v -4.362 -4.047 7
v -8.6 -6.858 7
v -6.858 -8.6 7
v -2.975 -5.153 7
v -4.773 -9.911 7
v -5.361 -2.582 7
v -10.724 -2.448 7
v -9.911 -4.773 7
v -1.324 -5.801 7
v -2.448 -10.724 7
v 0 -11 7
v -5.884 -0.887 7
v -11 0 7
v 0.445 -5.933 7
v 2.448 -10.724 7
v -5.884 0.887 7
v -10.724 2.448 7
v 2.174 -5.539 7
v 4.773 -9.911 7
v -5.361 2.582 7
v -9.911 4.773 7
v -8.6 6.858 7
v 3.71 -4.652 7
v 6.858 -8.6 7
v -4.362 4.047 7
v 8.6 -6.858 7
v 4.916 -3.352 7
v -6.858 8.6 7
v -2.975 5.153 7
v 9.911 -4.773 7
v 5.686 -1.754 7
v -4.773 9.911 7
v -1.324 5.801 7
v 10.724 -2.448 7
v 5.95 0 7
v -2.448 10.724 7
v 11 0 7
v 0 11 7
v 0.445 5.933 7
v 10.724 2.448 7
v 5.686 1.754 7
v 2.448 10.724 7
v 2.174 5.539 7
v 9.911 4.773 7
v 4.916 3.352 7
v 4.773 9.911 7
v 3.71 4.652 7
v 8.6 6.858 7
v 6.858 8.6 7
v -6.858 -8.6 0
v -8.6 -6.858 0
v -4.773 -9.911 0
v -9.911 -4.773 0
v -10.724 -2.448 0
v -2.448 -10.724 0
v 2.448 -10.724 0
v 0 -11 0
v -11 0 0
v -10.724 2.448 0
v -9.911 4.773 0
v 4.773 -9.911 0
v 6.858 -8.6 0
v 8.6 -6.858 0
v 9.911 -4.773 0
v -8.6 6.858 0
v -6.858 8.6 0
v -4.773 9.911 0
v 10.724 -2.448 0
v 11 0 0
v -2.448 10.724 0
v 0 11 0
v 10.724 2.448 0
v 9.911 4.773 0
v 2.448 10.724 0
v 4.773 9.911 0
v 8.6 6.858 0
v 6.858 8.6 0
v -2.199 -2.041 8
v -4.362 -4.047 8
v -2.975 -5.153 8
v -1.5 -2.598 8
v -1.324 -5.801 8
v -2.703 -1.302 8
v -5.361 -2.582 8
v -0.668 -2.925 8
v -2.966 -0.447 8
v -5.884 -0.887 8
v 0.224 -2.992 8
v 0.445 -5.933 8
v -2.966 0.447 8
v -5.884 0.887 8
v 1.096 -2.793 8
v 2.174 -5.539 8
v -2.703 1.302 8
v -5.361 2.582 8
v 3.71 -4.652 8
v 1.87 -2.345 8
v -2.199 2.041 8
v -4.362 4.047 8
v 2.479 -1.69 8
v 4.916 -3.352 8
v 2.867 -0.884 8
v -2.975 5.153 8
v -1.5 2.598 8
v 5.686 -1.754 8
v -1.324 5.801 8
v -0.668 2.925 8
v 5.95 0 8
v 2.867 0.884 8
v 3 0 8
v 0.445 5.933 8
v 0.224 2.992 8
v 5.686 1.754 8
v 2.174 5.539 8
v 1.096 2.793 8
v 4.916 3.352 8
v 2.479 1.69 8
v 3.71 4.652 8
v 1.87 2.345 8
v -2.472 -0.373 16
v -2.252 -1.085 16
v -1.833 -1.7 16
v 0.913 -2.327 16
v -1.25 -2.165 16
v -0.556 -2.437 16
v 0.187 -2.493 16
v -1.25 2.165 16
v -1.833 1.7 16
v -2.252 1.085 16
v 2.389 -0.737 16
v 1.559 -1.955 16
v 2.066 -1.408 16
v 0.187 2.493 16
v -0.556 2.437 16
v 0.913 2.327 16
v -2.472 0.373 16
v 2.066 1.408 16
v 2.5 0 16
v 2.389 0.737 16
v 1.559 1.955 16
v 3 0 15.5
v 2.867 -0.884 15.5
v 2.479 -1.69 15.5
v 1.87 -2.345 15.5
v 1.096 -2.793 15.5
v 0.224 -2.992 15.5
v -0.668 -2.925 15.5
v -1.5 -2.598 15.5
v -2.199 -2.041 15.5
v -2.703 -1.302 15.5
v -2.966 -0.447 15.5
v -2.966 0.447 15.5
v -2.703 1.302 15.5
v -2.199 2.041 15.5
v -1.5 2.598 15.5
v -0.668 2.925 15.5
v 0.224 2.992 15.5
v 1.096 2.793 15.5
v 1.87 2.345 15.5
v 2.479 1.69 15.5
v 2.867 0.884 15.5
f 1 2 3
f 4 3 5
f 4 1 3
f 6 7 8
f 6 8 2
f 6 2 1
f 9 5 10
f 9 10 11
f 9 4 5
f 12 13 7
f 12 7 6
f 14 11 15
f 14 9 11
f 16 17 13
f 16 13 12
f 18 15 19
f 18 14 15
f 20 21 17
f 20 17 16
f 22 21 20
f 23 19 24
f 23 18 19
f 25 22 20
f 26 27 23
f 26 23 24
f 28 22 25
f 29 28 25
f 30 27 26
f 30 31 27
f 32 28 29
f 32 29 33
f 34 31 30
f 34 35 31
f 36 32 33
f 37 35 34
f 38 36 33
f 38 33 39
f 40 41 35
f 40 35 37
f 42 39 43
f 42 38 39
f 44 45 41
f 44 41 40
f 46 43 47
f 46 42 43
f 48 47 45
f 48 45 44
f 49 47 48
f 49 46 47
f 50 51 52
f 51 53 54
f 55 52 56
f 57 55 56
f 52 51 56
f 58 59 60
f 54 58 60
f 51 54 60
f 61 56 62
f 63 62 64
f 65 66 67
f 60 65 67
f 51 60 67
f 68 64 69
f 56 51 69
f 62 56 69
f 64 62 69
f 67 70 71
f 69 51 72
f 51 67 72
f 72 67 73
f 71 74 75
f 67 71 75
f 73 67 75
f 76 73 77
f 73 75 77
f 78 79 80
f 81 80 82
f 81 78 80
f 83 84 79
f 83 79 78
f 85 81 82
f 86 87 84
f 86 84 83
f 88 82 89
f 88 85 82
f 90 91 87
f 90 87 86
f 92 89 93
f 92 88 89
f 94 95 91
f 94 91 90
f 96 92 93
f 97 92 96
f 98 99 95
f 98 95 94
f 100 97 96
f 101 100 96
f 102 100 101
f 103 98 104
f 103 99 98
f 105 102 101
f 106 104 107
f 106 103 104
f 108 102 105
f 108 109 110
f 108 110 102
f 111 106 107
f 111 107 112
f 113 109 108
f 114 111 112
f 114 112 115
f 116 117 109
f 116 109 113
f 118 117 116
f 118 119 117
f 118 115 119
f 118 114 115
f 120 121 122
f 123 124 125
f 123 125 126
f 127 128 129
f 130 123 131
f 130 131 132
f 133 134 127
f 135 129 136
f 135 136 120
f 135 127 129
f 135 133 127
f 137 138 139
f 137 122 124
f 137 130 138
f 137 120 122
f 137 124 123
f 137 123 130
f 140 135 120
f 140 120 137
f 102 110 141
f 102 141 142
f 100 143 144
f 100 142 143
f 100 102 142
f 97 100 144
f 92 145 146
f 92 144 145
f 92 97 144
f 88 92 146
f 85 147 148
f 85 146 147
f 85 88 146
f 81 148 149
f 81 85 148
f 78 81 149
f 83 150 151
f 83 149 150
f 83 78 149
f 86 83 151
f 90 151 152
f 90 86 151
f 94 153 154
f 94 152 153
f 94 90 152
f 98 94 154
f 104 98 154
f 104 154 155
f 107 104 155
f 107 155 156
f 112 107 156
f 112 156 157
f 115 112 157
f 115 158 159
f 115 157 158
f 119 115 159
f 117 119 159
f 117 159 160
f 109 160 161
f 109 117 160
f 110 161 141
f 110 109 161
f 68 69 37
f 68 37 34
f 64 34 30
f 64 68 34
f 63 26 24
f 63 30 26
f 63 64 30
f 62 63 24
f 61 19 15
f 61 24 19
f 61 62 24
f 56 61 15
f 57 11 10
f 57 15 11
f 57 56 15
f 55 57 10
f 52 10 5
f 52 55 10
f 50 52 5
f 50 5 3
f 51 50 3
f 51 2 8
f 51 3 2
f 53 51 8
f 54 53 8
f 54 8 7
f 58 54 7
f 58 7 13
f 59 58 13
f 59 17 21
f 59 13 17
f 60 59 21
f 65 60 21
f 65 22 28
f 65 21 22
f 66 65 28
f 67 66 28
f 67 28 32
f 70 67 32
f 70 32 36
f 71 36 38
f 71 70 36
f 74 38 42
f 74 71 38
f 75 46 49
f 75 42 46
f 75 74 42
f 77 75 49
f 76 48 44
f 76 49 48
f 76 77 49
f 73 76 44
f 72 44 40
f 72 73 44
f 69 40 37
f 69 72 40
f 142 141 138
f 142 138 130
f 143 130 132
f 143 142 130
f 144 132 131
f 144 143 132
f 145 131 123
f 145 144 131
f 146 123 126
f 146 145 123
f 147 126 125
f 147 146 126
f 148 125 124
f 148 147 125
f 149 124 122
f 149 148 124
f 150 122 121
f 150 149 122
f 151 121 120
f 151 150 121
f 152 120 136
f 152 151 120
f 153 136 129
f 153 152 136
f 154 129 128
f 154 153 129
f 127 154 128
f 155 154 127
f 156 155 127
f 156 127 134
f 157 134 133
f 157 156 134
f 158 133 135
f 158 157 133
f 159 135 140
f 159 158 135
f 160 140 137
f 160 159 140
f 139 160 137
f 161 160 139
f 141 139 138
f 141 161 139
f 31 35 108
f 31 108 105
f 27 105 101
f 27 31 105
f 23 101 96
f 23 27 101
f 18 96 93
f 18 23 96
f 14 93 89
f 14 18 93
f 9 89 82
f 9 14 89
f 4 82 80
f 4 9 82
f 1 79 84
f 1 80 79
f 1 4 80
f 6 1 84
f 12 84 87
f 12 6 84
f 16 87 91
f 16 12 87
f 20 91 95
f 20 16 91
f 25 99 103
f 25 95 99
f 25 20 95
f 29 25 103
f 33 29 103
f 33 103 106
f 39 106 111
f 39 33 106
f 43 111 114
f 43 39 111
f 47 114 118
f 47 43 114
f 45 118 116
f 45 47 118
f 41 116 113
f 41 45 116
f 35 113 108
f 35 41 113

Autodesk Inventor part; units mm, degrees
ref_plane "YZ Plane" through (0, 0, 0) normal (1, 0, 0) x (0, 1, 0)
ref_plane "XZ Plane" through (0, 0, 0) normal (0, 1, 0) x (-1, 0, 0)
ref_plane "XY Plane" through (0, 0, 0) normal (0, 0, 1) x (1, 0, 0)
sketch "草圖1" plane through (0, 0, 0) normal (0, 0, 1) x (1, 0, 0)
  circle A0 centre (0, 0) radius 11
  dimension "d0" = 22
extrude "擠出1" add sketch "草圖1" along normal blind 7
sketch "草圖2" plane through (0, 0, 7) normal (0, 0, 1) x (1, 0, 0)
  circle A0 centre (0, 0) radius 5.95
  dimension "d3" = 11.9
extrude "擠出2" add sketch "草圖2" along normal blind 1
sketch "草圖3" plane through (0, 0, 8) normal (0, 0, 1) x (1, 0, 0)
  circle A0 centre (0, 0) radius 3
  dimension "d6" = 6
extrude "擠出3" add sketch "草圖3" along normal blind 8
chamfer "倒角1" distance 0.5 angle 45 1 edges at (-3, 0, 16)
properties part number "bearing 22-M6"
